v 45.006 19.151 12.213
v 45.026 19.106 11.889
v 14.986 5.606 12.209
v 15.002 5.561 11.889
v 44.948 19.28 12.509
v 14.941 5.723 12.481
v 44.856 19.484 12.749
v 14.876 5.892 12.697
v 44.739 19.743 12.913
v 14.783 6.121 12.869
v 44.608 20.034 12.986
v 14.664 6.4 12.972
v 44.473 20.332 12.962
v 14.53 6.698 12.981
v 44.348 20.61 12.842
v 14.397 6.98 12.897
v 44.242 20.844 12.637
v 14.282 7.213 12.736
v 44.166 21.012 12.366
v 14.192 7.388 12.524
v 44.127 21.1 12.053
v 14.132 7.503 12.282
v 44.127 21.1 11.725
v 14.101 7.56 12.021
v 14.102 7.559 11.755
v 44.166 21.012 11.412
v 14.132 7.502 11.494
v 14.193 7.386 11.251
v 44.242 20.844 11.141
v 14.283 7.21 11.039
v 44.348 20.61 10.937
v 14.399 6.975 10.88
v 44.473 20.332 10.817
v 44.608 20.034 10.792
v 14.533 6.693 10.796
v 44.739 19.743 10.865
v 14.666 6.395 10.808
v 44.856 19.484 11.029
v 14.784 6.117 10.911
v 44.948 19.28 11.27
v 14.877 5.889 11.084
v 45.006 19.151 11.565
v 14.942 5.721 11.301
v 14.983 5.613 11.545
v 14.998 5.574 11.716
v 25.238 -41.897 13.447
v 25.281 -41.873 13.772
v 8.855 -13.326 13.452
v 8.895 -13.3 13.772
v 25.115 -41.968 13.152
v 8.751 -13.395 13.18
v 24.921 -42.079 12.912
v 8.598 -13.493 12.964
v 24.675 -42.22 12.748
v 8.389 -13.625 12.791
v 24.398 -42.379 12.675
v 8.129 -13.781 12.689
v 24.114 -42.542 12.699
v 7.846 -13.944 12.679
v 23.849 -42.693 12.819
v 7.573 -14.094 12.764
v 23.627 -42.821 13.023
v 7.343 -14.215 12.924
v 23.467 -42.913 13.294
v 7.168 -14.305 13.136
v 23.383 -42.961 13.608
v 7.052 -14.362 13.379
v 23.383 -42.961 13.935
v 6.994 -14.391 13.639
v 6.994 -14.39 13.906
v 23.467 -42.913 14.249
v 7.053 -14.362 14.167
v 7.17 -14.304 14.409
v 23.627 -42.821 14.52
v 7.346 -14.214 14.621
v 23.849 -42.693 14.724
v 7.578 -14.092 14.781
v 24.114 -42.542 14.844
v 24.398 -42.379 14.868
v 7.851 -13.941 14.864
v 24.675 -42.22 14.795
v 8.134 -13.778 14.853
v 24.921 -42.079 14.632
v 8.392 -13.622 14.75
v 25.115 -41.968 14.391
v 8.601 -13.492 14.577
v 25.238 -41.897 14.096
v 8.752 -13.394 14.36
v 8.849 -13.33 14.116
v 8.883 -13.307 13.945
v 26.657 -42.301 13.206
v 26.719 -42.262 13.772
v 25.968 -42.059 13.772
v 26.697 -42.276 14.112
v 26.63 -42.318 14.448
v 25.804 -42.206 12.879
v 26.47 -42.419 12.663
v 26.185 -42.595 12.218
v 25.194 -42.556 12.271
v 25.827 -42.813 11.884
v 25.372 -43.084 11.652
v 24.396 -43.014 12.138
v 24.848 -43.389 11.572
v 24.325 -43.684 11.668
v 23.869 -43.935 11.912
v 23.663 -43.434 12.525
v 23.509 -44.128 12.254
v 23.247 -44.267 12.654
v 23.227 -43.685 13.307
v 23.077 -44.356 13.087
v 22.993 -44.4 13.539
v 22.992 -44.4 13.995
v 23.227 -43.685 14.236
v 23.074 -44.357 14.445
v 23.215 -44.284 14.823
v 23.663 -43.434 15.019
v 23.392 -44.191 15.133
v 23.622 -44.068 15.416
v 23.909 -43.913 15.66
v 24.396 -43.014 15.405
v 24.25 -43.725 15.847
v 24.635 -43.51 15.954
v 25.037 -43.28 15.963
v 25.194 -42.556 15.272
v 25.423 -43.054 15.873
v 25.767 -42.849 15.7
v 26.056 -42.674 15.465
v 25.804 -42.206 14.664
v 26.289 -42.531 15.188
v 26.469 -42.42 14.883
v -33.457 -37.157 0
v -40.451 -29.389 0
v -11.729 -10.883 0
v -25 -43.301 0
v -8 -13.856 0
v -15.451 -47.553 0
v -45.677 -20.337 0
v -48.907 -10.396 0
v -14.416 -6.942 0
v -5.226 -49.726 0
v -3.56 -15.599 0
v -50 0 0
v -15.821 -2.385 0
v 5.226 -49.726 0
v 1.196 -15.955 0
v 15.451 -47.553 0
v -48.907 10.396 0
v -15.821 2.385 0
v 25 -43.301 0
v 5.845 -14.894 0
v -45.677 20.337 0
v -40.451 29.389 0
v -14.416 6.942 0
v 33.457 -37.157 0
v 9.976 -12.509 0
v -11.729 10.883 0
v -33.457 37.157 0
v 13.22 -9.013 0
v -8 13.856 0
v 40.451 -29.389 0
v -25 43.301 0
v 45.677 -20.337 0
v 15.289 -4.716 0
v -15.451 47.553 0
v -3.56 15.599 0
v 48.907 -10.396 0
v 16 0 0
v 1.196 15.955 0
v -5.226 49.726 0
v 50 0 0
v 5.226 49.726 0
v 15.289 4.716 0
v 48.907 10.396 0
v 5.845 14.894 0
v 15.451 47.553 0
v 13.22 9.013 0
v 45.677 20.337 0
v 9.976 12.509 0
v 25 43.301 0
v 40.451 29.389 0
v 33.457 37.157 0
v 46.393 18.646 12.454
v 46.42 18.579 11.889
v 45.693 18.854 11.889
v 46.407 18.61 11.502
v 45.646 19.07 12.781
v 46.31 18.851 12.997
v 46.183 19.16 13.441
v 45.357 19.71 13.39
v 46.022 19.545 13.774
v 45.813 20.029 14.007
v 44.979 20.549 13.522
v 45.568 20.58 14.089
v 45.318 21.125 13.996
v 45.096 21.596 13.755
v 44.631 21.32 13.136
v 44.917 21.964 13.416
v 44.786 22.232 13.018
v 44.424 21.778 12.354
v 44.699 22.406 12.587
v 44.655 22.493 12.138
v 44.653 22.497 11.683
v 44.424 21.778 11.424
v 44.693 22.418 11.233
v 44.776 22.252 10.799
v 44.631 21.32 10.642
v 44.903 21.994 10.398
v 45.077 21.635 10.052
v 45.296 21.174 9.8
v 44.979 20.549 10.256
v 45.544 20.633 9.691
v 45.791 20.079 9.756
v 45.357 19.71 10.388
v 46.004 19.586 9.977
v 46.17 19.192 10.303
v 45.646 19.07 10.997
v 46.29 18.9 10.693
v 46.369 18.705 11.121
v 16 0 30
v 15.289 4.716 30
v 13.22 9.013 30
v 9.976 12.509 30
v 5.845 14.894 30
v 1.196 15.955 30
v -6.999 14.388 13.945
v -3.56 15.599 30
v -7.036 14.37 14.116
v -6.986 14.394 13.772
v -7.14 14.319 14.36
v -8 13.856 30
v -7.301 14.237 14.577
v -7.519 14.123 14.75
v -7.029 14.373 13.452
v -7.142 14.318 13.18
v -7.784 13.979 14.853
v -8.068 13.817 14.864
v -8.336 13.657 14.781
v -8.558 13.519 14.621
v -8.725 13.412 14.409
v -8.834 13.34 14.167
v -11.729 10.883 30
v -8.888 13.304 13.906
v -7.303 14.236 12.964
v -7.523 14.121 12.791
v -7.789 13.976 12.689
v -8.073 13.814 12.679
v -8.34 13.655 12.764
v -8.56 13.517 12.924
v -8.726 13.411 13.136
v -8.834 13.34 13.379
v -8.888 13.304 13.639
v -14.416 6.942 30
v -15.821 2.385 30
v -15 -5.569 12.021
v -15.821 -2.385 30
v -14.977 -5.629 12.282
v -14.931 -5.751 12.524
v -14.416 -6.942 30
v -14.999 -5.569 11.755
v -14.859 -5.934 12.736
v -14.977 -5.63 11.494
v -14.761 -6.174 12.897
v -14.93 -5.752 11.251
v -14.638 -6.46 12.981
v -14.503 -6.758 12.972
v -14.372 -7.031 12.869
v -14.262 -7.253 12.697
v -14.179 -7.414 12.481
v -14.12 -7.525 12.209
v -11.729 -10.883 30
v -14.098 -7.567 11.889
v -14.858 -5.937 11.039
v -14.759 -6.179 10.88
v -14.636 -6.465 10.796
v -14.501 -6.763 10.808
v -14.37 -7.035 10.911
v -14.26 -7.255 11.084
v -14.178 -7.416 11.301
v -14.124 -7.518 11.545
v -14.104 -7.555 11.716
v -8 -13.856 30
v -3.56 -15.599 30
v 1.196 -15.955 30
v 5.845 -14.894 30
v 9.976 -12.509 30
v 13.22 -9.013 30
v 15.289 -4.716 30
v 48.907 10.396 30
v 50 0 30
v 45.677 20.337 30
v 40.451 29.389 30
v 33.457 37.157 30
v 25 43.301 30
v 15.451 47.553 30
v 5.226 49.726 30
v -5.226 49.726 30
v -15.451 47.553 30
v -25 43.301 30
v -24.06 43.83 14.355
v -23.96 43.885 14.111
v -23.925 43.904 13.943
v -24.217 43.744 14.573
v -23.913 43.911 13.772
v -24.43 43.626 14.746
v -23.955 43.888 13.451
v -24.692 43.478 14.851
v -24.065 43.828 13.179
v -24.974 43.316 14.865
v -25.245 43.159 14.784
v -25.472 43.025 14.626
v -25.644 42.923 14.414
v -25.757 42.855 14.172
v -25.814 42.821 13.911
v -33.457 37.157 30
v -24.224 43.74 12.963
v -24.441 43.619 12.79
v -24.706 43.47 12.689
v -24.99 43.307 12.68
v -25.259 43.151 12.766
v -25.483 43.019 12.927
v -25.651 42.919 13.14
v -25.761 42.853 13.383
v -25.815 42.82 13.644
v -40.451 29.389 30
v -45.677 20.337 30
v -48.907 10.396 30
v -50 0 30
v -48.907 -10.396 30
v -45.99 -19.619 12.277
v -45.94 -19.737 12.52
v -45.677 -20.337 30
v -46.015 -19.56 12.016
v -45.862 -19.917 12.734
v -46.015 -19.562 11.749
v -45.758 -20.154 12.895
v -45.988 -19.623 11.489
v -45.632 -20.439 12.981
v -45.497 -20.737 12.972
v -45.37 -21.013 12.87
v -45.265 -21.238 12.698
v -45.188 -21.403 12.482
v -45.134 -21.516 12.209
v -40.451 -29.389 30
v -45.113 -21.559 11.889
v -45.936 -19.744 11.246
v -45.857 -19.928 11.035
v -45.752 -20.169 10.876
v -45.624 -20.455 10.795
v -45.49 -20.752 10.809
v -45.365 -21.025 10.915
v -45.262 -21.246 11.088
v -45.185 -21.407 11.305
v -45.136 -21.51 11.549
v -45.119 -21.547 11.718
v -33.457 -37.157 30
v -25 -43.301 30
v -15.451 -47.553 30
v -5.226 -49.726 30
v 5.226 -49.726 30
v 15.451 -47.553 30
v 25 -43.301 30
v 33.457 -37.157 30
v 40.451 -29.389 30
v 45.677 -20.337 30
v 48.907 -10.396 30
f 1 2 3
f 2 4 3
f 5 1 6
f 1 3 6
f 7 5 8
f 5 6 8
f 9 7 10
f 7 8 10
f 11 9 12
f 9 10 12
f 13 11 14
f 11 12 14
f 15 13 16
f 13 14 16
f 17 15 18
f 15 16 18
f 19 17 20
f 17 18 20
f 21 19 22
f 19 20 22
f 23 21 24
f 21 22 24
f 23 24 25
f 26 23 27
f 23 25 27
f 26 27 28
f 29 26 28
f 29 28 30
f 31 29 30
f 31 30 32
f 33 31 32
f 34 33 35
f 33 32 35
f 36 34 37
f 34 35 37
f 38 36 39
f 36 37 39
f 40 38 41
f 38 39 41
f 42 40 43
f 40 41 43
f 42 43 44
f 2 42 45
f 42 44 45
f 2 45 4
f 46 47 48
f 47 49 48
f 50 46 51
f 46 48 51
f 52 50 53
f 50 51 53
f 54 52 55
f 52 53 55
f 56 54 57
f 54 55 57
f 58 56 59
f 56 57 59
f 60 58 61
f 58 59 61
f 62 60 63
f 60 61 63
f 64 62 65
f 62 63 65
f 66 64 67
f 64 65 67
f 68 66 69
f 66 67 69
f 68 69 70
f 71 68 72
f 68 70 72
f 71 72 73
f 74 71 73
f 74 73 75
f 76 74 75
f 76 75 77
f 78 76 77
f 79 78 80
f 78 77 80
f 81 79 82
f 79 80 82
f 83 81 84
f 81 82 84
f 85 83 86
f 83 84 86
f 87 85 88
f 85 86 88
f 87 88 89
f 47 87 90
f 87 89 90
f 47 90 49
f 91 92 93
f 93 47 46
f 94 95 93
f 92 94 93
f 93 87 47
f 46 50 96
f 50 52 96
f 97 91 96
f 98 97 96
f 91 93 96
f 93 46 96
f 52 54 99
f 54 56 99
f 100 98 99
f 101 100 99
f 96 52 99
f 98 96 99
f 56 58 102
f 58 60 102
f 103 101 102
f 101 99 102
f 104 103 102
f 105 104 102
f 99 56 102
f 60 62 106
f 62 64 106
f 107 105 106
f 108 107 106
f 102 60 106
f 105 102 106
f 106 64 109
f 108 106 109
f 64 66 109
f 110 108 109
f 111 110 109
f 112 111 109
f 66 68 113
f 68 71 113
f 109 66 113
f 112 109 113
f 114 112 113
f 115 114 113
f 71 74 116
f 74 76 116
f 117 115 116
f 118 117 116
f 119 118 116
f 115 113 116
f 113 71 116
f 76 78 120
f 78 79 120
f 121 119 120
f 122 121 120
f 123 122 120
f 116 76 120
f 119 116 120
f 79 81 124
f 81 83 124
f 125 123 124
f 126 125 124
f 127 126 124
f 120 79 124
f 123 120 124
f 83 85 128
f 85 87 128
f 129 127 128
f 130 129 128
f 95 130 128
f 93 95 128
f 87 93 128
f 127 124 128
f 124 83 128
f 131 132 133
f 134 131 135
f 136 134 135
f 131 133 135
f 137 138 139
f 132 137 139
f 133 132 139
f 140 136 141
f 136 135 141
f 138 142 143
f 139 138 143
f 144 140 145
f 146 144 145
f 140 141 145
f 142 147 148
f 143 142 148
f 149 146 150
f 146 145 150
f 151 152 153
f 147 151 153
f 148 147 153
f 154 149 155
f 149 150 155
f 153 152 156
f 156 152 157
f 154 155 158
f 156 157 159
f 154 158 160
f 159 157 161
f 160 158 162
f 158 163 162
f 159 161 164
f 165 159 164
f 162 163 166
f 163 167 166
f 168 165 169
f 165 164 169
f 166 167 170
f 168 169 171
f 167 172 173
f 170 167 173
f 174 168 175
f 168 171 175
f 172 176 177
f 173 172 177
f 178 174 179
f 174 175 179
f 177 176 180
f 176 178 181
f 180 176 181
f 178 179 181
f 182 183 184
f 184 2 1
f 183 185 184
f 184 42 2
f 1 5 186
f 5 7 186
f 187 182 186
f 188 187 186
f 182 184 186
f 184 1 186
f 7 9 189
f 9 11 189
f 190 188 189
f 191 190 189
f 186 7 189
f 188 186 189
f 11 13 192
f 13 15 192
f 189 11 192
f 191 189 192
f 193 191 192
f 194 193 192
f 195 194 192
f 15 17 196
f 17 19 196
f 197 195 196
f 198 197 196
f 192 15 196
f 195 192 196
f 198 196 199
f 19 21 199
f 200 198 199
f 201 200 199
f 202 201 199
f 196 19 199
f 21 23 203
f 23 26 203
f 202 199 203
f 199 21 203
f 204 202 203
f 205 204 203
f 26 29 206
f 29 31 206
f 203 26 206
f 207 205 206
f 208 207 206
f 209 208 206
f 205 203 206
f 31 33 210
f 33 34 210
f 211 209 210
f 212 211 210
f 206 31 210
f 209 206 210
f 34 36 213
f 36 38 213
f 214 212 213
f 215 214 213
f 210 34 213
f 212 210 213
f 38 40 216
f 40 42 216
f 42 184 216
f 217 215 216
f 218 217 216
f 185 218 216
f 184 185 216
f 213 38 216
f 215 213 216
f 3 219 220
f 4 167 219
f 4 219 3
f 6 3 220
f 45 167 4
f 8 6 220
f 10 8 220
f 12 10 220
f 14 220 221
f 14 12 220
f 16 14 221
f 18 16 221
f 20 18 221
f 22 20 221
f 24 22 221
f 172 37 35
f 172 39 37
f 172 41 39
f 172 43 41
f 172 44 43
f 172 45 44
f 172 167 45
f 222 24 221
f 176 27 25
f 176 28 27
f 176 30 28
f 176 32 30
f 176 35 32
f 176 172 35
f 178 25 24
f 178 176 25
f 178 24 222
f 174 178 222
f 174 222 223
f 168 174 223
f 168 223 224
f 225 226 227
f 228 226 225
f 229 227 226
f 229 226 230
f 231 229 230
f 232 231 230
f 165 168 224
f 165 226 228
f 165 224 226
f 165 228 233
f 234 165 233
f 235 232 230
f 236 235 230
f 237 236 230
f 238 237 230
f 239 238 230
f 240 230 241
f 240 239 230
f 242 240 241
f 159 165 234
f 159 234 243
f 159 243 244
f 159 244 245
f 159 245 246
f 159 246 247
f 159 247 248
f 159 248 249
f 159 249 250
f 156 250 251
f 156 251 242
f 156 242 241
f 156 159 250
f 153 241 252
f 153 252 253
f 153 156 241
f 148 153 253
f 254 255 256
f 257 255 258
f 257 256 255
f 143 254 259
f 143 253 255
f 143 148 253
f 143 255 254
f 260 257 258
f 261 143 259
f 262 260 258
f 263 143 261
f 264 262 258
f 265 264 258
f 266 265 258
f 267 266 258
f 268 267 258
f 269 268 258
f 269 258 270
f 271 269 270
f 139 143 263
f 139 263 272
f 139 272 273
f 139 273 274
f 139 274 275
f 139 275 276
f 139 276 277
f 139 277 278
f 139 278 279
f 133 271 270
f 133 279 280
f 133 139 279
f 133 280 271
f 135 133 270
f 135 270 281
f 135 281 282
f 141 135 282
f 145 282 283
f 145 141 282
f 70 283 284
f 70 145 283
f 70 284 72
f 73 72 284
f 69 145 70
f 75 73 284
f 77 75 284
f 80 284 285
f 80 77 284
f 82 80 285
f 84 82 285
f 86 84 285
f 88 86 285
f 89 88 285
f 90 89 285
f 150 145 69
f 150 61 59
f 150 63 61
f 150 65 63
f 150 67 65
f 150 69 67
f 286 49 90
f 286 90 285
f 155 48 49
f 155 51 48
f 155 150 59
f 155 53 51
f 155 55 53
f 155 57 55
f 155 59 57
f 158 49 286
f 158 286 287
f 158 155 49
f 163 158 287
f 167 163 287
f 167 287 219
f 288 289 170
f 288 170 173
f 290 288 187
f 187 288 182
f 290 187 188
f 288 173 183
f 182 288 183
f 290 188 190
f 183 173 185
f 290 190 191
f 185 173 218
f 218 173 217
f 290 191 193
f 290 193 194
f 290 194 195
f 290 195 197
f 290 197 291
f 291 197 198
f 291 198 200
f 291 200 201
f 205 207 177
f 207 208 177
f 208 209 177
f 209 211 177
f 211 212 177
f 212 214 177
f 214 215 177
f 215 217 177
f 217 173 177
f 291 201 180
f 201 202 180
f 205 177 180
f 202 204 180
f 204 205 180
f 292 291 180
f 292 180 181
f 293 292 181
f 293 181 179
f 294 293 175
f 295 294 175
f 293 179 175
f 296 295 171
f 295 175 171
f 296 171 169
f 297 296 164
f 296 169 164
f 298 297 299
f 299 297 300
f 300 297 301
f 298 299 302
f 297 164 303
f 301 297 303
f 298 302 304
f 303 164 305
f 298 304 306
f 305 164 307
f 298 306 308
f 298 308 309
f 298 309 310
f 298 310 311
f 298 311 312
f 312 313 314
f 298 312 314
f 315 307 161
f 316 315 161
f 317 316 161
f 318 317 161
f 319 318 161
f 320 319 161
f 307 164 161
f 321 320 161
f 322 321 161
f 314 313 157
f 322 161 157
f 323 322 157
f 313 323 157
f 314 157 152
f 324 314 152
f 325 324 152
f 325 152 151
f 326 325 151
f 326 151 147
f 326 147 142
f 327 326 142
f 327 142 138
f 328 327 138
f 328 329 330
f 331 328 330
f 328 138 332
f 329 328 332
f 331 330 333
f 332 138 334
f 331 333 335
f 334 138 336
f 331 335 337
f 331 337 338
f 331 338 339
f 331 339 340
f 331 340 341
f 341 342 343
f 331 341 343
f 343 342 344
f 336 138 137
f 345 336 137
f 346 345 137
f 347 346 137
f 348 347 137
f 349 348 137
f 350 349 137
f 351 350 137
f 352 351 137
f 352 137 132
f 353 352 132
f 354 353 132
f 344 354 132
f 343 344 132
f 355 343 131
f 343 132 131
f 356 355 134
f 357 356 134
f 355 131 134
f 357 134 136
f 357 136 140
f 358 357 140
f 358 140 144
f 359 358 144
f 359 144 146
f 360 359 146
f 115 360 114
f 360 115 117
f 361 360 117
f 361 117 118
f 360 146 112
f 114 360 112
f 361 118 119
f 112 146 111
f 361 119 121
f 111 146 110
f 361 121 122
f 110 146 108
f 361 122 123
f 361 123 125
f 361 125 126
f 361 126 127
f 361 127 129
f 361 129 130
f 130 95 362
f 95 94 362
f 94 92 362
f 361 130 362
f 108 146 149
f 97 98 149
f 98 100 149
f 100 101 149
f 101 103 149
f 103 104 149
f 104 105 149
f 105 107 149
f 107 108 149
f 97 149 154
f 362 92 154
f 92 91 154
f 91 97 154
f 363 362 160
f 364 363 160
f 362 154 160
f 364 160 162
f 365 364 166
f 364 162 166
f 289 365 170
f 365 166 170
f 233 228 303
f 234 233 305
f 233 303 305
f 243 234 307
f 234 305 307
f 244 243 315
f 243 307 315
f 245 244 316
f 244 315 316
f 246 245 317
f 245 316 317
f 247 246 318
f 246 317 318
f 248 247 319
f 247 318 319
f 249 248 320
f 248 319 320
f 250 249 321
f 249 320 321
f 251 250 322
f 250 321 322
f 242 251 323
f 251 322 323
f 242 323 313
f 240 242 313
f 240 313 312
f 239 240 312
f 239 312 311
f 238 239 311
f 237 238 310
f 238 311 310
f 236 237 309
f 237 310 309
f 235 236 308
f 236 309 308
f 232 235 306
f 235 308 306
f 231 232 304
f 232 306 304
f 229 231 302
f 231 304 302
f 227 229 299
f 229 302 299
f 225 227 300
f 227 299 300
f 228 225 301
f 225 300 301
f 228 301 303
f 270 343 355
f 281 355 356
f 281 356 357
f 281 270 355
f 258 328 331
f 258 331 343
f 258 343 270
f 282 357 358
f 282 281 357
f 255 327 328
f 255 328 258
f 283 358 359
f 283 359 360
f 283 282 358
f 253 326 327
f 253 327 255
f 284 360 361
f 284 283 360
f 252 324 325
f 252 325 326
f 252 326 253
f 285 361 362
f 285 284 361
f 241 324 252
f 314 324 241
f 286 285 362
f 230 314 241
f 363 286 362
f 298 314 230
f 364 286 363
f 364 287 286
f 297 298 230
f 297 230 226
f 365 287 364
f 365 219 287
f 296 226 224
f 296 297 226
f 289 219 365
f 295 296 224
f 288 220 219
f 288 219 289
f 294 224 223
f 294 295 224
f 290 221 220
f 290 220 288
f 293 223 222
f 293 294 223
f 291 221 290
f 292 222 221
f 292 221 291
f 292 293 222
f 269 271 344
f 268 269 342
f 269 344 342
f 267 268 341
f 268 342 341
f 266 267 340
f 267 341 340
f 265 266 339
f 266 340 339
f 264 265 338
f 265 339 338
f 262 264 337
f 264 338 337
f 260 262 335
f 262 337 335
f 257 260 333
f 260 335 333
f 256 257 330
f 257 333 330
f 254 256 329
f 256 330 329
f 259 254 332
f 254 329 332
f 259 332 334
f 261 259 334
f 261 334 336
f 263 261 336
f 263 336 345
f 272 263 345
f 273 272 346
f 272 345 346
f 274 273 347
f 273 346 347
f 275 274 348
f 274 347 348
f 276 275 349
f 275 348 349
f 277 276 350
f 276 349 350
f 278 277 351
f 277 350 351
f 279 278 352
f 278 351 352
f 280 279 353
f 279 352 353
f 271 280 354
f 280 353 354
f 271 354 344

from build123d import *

# Parameters (mm, degrees)
SKETCH2_R                                           = 50
SKETCH2_R_2                                         = 16
BOSS_EXTRUDE1_DEPTH                                 = 30
CSK_FOR_M2_COUNTERSUNK_FLAT_HEAD_SCREW1_D           = 2.2
CSK_FOR_M2_COUNTERSUNK_FLAT_HEAD_SCREW1_CSINK_D     = 4.4
CSK_FOR_M2_COUNTERSUNK_FLAT_HEAD_SCREW1_CSINK_ANGLE = 90
CSK_FOR_M2_COUNTERSUNK_FLAT_HEAD_SCR_2_D            = 2.2
CSK_FOR_M2_COUNTERSUNK_FLAT_HEAD_SCR_2_CSINK_D      = 4.4
CSK_FOR_M2_COUNTERSUNK_FLAT_HEAD_SCR_2_CSINK_ANGLE  = 90


with BuildPart() as part:
    # Sketch2 → Boss-Extrude1 (new body)
    with BuildSketch(Plane.XY):
        Circle(SKETCH2_R)
        Circle(SKETCH2_R_2, mode=Mode.SUBTRACT)
    extrude(amount=BOSS_EXTRUDE1_DEPTH)

    # CSK for M2 Countersunk Flat Head Screw1 (through all)
    with Locations(Plane(origin=(24.873497254, -43.374060617, 13.771522771), x_dir=(-0.86748121233, -0.497469945076, 0), z_dir=(0.497469945076, -0.86748121233, 0))):
        with Locations((0, 0)):
            CounterSinkHole(CSK_FOR_M2_COUNTERSUNK_FLAT_HEAD_SCREW1_D / 2, CSK_FOR_M2_COUNTERSUNK_FLAT_HEAD_SCREW1_CSINK_D / 2, counter_sink_angle=CSK_FOR_M2_COUNTERSUNK_FLAT_HEAD_SCREW1_CSINK_ANGLE)

    # CSK for M2 Countersunk Flat Head Scr 2 (through all)
    with Locations(Plane(origin=(45.576703695, 20.561227598, 11.889158969), x_dir=(-0.411224951932, 0.91153389345, 0), z_dir=(0.91153389345, 0.411224951932, 0))):
        with Locations((0, 0)):
            CounterSinkHole(CSK_FOR_M2_COUNTERSUNK_FLAT_HEAD_SCR_2_D / 2, CSK_FOR_M2_COUNTERSUNK_FLAT_HEAD_SCR_2_CSINK_D / 2, counter_sink_angle=CSK_FOR_M2_COUNTERSUNK_FLAT_HEAD_SCR_2_CSINK_ANGLE)


solid = part.part
